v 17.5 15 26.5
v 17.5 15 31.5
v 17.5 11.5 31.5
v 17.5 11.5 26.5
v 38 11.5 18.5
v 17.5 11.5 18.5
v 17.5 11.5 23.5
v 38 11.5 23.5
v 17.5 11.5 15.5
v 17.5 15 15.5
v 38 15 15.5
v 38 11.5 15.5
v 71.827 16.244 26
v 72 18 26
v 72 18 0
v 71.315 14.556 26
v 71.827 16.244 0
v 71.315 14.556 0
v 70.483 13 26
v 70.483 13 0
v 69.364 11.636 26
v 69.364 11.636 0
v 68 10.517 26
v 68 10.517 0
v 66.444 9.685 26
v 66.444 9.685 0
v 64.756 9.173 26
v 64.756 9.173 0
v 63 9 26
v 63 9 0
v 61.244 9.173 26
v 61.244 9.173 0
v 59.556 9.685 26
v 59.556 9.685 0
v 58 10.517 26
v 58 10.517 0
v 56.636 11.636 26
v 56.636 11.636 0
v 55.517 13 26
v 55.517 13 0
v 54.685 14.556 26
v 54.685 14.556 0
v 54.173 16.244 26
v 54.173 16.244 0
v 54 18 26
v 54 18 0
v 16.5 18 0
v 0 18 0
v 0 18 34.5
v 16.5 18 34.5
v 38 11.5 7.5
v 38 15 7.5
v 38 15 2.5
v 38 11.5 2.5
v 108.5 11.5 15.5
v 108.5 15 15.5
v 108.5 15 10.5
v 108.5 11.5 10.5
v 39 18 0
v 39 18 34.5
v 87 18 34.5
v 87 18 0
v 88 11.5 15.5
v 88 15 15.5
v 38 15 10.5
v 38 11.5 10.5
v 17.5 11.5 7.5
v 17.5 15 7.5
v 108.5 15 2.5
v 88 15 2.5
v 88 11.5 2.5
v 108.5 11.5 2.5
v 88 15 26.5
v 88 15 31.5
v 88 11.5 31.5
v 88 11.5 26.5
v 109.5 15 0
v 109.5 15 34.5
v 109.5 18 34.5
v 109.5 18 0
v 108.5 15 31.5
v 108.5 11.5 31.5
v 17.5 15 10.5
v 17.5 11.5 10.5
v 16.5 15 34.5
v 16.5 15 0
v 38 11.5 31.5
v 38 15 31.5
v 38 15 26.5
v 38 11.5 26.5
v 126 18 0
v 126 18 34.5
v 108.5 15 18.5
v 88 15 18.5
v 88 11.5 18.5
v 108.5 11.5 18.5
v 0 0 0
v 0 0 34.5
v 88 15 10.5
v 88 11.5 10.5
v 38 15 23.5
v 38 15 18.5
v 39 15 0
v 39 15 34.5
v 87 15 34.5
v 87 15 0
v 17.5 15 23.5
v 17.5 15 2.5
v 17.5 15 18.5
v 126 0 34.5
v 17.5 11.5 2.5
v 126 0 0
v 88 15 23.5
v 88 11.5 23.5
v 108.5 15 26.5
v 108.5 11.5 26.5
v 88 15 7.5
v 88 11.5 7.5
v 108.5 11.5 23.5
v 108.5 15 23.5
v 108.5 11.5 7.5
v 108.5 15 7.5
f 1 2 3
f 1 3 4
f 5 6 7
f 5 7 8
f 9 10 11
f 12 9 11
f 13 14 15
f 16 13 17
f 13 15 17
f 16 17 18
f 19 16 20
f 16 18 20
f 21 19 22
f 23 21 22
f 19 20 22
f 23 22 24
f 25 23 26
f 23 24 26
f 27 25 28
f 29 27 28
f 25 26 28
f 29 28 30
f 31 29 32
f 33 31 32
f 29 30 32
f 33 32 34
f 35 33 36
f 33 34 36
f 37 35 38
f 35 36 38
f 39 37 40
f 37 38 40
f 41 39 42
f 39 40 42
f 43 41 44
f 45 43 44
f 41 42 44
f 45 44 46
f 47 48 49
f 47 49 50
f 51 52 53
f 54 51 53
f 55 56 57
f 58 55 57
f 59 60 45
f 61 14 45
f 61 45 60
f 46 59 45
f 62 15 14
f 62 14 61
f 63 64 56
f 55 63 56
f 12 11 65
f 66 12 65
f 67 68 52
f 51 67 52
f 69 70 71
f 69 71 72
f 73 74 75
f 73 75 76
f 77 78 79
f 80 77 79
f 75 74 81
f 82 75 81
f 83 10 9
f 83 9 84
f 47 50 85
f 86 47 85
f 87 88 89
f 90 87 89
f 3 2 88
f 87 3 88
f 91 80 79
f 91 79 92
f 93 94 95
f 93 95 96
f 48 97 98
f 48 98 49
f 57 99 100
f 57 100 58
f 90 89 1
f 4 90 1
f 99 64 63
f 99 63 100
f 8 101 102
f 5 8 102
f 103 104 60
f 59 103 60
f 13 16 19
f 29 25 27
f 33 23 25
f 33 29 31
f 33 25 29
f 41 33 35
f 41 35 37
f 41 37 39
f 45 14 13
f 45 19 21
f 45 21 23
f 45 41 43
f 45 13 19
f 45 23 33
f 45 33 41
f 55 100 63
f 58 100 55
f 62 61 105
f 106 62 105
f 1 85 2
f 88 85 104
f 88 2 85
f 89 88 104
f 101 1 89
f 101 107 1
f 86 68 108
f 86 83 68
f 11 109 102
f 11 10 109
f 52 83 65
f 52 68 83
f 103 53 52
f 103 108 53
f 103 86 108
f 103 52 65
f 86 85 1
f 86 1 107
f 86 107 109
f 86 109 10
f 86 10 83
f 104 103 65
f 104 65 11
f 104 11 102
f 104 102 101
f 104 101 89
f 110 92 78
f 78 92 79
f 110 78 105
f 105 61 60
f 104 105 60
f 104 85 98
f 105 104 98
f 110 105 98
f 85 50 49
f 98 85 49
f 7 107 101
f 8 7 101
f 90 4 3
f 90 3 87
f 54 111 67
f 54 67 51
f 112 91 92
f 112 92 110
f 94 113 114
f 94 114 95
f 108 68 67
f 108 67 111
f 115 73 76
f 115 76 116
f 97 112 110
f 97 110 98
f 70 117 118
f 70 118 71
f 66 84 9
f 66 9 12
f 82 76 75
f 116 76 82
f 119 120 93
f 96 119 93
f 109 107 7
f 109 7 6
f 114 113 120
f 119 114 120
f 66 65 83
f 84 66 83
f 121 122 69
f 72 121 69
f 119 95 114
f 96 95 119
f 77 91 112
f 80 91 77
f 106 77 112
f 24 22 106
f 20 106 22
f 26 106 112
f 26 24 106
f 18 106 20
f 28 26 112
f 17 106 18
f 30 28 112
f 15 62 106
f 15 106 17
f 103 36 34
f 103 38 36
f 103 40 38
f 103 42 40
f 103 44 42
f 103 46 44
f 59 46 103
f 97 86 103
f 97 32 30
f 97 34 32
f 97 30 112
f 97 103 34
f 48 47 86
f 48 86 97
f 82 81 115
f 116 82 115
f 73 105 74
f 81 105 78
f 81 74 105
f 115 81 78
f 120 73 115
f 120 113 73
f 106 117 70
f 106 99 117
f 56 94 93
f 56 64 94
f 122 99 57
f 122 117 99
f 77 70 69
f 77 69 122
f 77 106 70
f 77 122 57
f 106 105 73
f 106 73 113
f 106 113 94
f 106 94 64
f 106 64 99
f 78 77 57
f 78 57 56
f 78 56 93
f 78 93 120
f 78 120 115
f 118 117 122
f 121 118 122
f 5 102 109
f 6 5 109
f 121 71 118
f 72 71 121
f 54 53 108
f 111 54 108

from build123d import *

# Parameters (mm, degrees)
SALIENTE_EXTRUIR1_DEPTH = 34.5
CROQUIS2_R              = 9
CORTAR_EXTRUIR1_DEPTH   = 26
CROQUIS3_W              = 10
CROQUIS3_H              = 5
CROQUIS3_W_2            = 10.5
CROQUIS3_W_3            = 20.5
CORTAR_EXTRUIR2_DEPTH   = 3.5


with BuildPart() as part:
    # Croquis1 → Saliente-Extruir1 (new body)
    with BuildSketch(Plane.XY):
        Polygon((0, 0), (0, 18), (16.5, 18), (16.5, 15), (39, 15), (39, 18), (87, 18), (87, 15), (109.5, 15), (109.5, 18), (126, 18), (126, 0), align=None)
    extrude(amount=SALIENTE_EXTRUIR1_DEPTH)

    # Croquis2 → Cortar-Extruir1 (cut)
    with BuildSketch(Plane(origin=(0, 0, 0), x_dir=(-1, 0, 0), z_dir=(0, 0, -1))):
        with Locations((-63, 18)):
            Circle(CROQUIS2_R)
    extrude(amount=-CORTAR_EXTRUIR1_DEPTH, mode=Mode.SUBTRACT)

    # Croquis3 → Cortar-Extruir2 (cut)
    with BuildSketch(Plane(origin=(0, 15, 0), x_dir=(1, 0, 0), z_dir=(0, 1, 0))):
        with Locations((22.5, -29)):
            Rectangle(CROQUIS3_W, CROQUIS3_H)
        with Locations((32.75, -29)):
            Rectangle(CROQUIS3_W_2, CROQUIS3_H)
        with Locations((32.75, -21)):
            Rectangle(CROQUIS3_W_2, CROQUIS3_H)
        with Locations((22.5, -21)):
            Rectangle(CROQUIS3_W, CROQUIS3_H)
        with Locations((32.75, -13)):
            Rectangle(CROQUIS3_W_2, CROQUIS3_H)
        with Locations((22.5, -13)):
            Rectangle(CROQUIS3_W, CROQUIS3_H)
        with Locations((32.75, -5)):
            Rectangle(CROQUIS3_W_2, CROQUIS3_H)
        with Locations((22.5, -5)):
            Rectangle(CROQUIS3_W, CROQUIS3_H)
        with Locations((98.25, -29)):
            Rectangle(CROQUIS3_W_3, CROQUIS3_H)
        with Locations((98.25, -21)):
            Rectangle(CROQUIS3_W_3, CROQUIS3_H)
        with Locations((98.25, -13)):
            Rectangle(CROQUIS3_W_3, CROQUIS3_H)
        with Locations((98.25, -5)):
            Rectangle(CROQUIS3_W_3, CROQUIS3_H)
    extrude(amount=-CORTAR_EXTRUIR2_DEPTH, mode=Mode.SUBTRACT)


solid = part.part
